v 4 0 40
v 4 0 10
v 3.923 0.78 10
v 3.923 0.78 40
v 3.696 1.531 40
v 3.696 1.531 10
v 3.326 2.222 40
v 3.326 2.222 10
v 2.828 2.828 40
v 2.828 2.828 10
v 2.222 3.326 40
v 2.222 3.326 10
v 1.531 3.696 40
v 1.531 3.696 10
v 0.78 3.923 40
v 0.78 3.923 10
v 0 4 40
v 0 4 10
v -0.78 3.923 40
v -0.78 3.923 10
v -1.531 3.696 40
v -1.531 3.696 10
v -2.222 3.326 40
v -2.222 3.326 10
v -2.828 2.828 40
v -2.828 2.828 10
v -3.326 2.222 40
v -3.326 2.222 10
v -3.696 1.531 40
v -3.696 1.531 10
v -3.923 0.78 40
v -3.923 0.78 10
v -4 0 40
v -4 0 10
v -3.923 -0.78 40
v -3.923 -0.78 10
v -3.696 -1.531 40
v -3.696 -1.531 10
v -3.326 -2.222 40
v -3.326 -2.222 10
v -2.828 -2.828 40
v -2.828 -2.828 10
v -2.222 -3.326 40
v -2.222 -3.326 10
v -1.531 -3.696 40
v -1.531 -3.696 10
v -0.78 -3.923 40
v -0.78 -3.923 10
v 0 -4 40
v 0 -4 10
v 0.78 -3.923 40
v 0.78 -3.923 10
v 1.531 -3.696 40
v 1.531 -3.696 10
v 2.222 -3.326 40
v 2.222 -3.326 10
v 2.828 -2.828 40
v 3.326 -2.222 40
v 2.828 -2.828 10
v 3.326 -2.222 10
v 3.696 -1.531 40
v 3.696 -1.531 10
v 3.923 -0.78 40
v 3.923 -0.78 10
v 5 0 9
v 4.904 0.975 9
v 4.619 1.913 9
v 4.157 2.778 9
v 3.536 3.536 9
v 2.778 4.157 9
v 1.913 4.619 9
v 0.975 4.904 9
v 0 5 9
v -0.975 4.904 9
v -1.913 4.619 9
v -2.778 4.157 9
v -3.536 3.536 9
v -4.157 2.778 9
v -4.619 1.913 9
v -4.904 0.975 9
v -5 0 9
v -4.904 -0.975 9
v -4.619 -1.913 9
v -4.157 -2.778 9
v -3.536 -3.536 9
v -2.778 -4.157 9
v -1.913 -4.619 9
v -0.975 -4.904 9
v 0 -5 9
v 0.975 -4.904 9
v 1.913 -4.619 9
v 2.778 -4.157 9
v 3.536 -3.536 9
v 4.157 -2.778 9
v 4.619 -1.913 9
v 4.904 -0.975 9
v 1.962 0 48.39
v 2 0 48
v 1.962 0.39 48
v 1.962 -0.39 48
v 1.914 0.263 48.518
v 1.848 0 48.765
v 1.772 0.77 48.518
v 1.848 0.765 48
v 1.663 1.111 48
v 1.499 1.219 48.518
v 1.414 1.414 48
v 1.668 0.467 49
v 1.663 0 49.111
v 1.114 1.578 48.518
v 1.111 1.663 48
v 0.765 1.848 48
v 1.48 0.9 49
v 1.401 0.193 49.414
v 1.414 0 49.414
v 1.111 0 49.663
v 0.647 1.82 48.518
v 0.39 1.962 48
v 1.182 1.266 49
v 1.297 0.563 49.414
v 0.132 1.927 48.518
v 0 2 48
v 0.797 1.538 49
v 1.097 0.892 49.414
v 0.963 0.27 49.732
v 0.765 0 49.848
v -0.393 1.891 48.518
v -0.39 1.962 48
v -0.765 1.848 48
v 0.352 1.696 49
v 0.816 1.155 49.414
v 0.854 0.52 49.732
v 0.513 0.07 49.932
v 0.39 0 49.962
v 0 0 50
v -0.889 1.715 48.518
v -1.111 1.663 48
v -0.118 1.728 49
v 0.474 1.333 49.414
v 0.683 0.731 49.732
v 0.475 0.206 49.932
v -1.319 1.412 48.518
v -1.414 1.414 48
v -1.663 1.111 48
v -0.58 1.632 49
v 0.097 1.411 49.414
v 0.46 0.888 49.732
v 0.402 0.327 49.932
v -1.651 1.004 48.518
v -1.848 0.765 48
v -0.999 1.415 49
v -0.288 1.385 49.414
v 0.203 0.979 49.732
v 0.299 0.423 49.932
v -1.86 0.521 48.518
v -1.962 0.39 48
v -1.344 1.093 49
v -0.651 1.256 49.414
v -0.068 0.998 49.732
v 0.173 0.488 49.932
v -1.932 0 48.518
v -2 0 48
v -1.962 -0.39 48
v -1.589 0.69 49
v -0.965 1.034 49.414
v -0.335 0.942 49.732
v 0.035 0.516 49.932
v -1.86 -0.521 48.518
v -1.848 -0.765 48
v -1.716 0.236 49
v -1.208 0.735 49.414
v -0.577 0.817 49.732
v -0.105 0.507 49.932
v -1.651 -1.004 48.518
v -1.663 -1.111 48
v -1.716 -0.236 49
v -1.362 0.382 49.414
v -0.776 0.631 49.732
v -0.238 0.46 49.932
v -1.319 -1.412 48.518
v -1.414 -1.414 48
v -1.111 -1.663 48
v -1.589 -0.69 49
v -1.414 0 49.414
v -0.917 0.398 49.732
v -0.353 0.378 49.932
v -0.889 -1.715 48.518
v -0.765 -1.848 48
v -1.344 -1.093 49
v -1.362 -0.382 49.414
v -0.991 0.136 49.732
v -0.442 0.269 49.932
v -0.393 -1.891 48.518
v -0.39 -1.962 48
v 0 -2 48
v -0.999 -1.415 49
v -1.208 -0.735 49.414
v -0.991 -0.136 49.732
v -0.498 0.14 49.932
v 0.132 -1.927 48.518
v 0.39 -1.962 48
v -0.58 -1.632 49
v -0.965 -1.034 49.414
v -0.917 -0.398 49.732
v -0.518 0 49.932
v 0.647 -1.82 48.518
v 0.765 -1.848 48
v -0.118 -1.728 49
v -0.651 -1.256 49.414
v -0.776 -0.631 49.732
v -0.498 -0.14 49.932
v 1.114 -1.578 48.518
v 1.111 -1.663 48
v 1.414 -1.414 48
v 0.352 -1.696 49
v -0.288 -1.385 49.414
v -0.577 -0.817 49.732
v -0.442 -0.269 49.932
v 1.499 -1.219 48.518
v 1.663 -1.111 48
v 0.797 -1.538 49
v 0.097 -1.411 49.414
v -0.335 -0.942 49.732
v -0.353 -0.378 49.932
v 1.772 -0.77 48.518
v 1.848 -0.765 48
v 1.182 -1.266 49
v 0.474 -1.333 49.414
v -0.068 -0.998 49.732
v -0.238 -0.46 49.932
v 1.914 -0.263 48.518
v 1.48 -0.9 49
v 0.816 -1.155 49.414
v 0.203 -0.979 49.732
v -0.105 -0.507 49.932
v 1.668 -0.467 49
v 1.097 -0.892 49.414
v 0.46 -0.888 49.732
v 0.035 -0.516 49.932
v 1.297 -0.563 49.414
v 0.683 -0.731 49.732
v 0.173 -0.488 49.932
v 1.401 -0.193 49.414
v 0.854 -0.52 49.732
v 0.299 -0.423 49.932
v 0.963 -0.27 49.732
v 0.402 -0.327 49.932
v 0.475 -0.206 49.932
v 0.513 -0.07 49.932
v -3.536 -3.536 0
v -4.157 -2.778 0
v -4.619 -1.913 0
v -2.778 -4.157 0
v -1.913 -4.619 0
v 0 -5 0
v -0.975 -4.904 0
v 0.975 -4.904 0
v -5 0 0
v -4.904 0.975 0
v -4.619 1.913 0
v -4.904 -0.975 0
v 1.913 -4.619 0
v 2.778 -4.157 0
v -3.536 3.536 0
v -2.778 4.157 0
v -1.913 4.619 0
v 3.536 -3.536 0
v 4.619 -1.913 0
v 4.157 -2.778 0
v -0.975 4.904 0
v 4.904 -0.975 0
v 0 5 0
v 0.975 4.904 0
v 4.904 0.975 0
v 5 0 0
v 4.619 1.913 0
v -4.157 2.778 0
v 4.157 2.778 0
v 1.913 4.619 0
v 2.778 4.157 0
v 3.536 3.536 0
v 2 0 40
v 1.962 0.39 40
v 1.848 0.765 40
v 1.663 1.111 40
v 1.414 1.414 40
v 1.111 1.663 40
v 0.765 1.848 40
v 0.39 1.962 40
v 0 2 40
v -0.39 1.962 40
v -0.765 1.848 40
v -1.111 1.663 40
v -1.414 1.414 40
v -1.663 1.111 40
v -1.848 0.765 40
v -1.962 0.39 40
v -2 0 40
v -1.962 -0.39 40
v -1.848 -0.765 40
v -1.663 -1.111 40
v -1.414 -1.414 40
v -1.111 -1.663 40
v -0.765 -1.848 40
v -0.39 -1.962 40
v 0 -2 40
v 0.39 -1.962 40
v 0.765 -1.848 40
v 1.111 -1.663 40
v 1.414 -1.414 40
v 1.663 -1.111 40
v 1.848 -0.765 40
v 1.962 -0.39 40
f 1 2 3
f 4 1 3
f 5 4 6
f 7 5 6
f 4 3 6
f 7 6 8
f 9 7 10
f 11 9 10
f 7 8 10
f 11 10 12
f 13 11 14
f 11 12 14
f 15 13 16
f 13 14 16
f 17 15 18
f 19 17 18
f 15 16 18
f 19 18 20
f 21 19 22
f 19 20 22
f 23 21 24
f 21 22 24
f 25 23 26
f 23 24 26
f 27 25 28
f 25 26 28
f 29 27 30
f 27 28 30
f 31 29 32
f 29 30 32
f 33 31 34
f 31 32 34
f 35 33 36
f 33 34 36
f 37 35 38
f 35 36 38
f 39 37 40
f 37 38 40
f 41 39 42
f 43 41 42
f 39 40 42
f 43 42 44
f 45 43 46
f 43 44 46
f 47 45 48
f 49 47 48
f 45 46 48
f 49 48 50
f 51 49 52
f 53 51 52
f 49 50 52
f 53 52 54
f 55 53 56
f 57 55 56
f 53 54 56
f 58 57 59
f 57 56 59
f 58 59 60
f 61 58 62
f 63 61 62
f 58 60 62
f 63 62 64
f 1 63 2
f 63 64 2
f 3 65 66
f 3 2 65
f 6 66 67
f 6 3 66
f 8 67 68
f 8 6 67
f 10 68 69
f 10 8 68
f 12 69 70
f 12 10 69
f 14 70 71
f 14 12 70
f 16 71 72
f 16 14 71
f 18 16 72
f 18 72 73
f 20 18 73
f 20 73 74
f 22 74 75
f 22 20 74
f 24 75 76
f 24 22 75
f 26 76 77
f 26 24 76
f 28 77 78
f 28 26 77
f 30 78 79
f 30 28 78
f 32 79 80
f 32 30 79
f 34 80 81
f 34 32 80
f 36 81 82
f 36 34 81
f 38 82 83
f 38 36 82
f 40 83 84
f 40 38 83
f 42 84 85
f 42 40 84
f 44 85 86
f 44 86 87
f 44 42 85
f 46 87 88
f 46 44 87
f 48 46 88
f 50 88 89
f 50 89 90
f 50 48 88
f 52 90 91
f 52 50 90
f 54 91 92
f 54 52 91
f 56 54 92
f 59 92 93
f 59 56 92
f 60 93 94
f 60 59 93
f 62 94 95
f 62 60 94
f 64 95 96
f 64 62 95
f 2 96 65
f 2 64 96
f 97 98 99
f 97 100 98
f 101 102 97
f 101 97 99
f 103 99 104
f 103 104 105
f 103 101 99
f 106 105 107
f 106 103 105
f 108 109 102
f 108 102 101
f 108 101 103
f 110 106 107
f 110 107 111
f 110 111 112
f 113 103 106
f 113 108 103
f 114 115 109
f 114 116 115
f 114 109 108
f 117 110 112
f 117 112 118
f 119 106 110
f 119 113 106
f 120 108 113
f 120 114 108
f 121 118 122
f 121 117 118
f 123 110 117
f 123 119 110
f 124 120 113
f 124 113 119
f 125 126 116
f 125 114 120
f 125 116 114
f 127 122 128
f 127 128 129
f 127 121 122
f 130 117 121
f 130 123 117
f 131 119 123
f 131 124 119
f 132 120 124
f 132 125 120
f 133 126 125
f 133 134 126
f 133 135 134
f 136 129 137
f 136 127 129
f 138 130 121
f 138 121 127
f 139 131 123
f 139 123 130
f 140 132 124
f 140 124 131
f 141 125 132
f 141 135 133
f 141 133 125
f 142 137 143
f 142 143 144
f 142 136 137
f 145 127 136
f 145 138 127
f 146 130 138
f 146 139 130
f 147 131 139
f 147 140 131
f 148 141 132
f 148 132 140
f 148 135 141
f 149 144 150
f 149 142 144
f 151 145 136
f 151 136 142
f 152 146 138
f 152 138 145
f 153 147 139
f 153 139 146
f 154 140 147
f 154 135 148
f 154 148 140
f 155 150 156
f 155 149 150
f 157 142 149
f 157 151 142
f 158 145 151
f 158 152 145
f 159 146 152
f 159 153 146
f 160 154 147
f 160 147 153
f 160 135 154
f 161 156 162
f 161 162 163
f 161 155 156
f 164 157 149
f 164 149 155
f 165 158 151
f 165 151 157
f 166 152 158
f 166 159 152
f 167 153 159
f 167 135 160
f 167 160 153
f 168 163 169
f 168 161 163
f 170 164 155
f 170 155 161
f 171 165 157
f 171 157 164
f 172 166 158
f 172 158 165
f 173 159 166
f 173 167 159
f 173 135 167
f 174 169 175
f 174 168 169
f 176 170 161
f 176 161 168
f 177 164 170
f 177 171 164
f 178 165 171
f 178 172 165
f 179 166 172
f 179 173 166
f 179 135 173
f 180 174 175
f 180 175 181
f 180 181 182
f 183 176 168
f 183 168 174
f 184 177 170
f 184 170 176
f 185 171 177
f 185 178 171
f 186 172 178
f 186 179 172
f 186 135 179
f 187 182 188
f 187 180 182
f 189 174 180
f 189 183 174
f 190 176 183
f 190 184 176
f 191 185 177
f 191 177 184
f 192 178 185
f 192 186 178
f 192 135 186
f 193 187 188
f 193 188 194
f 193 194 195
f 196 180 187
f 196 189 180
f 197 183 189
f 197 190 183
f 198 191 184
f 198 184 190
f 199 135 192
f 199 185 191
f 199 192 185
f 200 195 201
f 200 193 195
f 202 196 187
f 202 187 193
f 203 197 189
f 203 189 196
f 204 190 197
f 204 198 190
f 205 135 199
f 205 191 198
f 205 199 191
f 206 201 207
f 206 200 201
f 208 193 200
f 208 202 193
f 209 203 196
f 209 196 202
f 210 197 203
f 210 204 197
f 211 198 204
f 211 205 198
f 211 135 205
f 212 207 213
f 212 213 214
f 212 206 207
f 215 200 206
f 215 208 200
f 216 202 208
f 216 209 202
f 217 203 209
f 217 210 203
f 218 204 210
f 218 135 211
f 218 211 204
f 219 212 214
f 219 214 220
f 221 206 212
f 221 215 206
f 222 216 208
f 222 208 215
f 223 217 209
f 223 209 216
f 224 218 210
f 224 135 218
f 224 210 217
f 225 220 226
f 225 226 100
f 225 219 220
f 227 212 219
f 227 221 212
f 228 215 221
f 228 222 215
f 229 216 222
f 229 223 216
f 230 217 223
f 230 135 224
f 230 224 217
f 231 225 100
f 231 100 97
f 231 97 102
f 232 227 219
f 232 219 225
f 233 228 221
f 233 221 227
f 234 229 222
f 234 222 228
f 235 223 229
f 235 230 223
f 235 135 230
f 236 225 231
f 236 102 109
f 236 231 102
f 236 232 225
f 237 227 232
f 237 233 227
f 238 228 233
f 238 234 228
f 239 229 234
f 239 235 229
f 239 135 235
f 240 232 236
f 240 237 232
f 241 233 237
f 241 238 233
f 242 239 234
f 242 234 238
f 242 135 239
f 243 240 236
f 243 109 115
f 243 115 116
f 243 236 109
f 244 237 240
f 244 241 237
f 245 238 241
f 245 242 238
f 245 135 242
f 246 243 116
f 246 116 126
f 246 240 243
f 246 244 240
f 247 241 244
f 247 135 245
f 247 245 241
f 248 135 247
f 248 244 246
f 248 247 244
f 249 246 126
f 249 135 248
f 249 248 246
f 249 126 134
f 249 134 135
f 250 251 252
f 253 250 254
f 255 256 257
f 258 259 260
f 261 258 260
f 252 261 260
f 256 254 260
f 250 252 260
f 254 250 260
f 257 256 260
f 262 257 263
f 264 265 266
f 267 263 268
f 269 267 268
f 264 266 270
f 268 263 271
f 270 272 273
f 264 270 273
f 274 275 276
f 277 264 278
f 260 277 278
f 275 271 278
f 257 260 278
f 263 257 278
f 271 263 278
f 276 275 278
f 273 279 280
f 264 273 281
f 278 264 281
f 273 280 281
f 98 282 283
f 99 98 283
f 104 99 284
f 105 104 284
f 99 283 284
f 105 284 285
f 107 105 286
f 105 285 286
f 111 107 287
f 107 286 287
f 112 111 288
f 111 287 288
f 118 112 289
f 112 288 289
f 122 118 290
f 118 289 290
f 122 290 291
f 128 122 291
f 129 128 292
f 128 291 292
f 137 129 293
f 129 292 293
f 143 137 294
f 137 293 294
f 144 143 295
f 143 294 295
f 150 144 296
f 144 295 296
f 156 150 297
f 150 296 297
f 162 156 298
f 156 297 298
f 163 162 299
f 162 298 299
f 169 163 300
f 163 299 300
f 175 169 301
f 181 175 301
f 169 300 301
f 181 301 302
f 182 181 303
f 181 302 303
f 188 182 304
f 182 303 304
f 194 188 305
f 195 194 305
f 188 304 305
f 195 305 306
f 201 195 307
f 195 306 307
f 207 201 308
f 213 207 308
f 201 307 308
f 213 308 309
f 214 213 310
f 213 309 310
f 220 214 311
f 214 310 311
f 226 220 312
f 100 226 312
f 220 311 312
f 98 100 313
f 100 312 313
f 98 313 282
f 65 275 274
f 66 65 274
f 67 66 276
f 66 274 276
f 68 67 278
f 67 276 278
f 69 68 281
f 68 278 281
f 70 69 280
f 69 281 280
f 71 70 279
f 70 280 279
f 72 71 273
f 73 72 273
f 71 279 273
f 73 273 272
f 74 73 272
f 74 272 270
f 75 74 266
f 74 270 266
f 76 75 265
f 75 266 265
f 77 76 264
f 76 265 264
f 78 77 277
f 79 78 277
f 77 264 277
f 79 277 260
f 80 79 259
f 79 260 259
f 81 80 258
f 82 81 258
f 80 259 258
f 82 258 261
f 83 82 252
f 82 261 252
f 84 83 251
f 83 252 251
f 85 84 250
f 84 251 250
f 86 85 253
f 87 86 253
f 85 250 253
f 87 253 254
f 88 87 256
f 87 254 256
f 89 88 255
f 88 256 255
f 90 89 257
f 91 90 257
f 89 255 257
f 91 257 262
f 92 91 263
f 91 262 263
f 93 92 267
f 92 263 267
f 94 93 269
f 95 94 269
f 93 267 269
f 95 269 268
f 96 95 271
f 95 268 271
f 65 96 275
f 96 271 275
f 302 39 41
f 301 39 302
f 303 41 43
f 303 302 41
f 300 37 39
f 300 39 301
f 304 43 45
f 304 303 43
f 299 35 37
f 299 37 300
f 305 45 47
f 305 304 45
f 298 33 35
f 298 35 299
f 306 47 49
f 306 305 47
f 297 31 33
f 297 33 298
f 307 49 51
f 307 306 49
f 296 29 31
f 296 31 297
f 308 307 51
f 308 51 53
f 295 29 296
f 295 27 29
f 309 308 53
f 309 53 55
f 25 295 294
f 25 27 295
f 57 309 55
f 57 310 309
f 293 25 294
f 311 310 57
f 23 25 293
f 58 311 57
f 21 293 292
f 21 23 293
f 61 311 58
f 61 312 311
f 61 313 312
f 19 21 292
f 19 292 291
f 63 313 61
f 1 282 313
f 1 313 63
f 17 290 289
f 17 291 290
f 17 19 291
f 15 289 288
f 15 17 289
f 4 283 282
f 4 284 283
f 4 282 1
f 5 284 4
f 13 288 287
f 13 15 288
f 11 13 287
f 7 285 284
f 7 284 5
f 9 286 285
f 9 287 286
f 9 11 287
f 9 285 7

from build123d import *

# Parameters (mm, degrees)
SKETCH_1_R      = 5
EXTRUDE_1_DEPTH = 10
CHAMFER_1_SIZE  = 1
SKETCH_2_R      = 4
EXTRUDE_2_DEPTH = 30
SKETCH_3_R      = 2
EXTRUDE_3_DEPTH = 10
FILLET_1_R      = 2


with BuildPart() as part:
    # Эскиз1 → Бобышка-Вытянуть1 (new body)
    with BuildSketch(Plane.XY):
        Circle(SKETCH_1_R)
    extrude(amount=EXTRUDE_1_DEPTH)

    # Фаска1
    chamfer_1_edges = [part.edges().sort_by_distance(p)[0] for p in [
        (-5, 0, 10),
    ]]
    chamfer(chamfer_1_edges, length=CHAMFER_1_SIZE)

    # Эскиз2 → Бобышка-Вытянуть2 (add)
    with BuildSketch(Plane.XY.offset(10)):
        Circle(SKETCH_2_R)
    extrude(amount=EXTRUDE_2_DEPTH)

    # Эскиз3 → Бобышка-Вытянуть3 (add)
    with BuildSketch(Plane.XY.offset(40)):
        Circle(SKETCH_3_R)
    extrude(amount=EXTRUDE_3_DEPTH)

    # Скругление1
    fillet_1_edges = [part.edges().sort_by_distance(p)[0] for p in [
        (-2, 0, 50),
    ]]
    fillet(fillet_1_edges, radius=FILLET_1_R)


solid = part.part
